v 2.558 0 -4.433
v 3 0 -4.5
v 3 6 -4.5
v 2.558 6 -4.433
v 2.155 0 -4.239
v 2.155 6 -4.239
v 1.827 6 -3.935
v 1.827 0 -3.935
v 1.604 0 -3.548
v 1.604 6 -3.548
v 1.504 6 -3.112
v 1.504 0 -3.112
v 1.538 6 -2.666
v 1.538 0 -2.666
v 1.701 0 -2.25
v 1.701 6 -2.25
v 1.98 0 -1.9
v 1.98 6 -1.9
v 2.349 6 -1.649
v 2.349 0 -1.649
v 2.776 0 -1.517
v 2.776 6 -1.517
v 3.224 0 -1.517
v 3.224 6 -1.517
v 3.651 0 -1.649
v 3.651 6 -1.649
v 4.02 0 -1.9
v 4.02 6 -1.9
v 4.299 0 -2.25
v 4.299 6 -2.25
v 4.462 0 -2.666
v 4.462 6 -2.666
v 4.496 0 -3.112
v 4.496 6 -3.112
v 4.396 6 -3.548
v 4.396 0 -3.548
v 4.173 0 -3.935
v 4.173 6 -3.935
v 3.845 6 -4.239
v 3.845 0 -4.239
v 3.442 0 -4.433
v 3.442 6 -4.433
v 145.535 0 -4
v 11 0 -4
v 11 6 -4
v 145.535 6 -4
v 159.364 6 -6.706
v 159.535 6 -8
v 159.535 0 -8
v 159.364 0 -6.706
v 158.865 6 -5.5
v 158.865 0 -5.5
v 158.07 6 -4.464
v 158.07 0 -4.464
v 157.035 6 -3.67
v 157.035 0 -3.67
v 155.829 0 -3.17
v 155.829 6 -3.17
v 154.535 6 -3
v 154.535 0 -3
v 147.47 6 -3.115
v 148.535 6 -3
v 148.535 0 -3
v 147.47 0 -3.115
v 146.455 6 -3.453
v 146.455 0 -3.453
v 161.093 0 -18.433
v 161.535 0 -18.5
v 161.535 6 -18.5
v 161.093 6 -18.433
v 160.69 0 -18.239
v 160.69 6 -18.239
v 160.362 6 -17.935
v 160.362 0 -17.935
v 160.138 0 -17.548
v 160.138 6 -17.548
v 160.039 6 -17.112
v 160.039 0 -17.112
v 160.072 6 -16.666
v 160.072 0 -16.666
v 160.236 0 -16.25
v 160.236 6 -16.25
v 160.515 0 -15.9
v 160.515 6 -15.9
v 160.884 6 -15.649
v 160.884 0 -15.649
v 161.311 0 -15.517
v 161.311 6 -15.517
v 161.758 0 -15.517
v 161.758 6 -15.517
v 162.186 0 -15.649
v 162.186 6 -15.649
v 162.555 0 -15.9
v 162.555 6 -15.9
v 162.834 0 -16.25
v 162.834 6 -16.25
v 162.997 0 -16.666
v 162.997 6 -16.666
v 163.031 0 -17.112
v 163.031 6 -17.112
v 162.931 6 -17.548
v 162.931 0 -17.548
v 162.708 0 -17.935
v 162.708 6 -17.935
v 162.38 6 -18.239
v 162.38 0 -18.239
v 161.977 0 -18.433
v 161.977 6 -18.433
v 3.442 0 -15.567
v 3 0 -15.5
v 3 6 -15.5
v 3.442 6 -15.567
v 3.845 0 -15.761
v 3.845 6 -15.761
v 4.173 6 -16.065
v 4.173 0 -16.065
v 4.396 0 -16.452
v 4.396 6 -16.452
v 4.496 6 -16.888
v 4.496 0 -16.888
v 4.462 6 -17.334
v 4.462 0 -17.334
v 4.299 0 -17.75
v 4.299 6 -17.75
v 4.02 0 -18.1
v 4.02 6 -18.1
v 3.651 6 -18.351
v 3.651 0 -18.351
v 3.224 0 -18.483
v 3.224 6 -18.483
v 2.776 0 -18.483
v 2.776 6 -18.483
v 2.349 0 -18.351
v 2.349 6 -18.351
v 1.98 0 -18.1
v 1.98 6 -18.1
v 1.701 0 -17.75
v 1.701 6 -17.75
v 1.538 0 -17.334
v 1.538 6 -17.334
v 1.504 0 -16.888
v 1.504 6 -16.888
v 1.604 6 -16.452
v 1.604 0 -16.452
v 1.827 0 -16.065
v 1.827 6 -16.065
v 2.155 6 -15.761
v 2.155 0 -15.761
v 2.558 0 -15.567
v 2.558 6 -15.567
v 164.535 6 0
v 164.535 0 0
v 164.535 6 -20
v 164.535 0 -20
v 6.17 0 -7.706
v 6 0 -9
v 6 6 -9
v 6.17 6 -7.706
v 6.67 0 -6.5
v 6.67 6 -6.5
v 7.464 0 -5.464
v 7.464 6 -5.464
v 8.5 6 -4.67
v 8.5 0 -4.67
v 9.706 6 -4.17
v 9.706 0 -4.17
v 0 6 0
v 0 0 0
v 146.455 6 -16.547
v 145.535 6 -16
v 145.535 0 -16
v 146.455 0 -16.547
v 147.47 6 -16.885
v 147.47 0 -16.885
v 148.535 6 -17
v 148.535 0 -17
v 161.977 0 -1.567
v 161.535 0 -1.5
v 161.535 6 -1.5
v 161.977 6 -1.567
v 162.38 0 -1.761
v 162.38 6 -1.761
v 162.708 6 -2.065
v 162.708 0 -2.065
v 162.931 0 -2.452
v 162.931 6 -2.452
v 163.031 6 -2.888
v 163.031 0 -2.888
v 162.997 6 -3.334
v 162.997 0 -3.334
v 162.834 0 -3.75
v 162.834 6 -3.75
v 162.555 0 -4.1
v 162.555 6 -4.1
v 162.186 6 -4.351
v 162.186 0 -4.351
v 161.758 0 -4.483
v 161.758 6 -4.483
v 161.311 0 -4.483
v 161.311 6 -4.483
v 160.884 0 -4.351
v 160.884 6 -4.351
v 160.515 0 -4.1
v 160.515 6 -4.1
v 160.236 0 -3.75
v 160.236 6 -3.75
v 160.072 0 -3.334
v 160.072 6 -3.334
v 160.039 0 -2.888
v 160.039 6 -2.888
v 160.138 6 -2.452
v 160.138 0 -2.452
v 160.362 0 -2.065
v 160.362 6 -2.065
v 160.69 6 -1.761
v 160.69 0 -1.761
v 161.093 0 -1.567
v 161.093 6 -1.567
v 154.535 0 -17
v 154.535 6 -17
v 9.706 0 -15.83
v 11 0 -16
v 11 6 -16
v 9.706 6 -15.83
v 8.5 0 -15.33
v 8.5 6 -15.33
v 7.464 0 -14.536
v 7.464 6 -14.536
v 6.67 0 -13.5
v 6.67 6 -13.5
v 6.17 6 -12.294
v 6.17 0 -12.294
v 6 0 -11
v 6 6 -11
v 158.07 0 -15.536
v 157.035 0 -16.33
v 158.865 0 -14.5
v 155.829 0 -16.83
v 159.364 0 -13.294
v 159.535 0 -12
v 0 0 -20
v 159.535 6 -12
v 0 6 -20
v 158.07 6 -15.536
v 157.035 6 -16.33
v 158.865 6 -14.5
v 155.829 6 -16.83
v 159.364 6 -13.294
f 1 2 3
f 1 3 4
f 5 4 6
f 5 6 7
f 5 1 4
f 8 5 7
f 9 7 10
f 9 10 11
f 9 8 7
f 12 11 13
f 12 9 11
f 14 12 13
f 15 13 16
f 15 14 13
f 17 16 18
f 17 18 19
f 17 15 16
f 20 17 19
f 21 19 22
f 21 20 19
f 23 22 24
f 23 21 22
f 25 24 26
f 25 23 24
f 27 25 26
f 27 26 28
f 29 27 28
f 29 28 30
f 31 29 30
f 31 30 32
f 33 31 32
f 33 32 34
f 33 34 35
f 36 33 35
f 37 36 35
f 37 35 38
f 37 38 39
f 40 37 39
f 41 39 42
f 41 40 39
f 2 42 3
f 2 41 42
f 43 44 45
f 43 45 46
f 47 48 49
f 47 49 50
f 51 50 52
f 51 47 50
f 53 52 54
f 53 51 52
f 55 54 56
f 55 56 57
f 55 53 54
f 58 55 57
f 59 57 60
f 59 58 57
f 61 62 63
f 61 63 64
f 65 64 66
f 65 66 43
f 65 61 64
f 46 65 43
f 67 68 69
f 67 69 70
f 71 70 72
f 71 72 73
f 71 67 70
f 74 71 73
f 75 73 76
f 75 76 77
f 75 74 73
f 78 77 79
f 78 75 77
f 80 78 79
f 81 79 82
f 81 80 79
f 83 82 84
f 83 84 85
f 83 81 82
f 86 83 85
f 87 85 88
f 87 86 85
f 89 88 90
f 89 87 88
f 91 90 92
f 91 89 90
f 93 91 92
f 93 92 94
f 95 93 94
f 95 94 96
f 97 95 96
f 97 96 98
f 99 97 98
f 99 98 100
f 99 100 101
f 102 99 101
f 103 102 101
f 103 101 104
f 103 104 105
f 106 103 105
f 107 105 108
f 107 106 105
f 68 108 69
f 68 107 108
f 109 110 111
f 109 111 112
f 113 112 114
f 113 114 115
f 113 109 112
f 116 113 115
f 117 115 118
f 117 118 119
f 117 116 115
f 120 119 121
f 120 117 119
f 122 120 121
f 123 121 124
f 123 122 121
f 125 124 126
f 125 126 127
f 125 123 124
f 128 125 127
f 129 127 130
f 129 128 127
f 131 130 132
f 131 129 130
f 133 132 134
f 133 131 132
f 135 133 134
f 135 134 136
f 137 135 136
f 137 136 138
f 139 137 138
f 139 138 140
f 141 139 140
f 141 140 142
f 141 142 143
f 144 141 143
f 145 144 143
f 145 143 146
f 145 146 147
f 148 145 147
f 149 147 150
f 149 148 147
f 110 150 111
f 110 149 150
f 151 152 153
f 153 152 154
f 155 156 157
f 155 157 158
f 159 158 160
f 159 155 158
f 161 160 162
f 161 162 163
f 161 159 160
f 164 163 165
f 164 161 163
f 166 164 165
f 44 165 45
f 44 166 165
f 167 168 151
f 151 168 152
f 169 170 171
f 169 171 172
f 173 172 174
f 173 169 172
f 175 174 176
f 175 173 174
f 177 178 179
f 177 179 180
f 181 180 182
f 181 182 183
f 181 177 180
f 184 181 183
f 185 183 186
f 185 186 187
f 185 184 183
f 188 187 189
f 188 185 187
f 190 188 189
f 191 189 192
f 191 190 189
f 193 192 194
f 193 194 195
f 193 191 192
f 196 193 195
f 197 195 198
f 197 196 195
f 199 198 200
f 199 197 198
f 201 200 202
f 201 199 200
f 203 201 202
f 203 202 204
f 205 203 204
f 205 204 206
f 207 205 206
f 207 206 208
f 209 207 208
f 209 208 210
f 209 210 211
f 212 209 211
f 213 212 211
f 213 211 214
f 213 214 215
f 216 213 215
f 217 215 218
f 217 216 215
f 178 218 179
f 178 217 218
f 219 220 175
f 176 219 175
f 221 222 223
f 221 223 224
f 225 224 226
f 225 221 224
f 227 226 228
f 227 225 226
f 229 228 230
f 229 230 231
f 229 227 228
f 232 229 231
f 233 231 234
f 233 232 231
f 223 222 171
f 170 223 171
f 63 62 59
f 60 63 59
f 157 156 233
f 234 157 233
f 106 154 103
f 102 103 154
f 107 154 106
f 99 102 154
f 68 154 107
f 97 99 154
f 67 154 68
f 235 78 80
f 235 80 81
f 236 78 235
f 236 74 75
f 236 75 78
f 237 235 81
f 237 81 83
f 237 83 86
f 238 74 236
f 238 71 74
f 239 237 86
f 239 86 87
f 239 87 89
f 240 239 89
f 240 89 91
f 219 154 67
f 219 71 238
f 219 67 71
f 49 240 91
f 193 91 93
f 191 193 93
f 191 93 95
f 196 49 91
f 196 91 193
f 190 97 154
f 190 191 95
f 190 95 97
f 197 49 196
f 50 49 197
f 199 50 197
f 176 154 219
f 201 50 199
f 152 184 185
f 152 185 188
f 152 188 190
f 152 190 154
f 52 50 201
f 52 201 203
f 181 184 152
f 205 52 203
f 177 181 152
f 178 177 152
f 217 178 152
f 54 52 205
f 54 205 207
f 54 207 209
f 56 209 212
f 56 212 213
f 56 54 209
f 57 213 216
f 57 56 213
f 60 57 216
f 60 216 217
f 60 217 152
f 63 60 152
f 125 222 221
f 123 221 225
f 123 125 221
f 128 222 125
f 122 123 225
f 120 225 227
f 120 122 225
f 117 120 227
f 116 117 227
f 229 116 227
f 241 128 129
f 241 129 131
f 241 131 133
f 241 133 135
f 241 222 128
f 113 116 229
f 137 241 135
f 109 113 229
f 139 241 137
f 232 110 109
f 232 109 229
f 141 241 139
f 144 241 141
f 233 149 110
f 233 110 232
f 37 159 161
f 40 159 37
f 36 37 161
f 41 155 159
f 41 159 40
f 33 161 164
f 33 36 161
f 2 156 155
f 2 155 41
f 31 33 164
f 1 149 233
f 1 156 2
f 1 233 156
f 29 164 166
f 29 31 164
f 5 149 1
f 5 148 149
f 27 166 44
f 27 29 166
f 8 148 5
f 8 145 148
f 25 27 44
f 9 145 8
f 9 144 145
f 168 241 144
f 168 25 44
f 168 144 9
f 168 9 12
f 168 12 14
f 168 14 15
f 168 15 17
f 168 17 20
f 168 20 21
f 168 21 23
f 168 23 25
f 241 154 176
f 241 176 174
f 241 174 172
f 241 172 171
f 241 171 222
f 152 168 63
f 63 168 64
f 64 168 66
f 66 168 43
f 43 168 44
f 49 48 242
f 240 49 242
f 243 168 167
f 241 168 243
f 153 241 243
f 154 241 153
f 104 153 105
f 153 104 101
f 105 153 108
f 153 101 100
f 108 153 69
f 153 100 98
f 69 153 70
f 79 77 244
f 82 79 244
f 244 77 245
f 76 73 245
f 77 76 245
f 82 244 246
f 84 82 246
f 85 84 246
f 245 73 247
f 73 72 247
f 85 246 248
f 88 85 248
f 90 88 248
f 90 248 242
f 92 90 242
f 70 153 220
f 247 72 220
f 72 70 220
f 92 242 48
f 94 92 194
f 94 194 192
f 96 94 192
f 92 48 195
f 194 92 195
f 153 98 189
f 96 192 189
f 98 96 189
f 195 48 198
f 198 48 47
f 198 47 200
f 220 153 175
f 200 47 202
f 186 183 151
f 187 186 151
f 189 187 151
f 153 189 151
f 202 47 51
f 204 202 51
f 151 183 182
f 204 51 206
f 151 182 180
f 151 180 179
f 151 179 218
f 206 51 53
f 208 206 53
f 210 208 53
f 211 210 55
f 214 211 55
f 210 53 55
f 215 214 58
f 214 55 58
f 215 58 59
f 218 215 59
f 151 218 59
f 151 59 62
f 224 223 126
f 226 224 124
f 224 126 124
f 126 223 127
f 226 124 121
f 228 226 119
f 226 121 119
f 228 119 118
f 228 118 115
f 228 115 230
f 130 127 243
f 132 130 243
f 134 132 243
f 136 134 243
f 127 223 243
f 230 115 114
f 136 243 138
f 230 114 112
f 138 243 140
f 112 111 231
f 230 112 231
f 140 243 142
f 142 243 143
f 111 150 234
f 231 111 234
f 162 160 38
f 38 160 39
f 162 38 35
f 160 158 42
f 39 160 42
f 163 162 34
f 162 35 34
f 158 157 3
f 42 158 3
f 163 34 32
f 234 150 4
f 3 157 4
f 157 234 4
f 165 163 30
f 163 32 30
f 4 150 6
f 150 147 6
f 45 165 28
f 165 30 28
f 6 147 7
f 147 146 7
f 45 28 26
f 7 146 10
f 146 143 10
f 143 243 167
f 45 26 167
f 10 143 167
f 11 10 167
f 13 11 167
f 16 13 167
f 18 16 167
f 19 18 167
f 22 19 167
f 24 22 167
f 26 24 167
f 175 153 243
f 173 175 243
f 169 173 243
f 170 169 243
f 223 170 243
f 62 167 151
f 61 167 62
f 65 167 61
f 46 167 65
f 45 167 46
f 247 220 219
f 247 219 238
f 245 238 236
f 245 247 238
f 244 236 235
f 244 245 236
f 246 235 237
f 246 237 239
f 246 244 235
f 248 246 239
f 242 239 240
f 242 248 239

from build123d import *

# Parameters (mm, degrees)
SKETCH1_W           = 164.534777256
SKETCH1_H           = 20
SKETCH1_R           = 1.5
SKETCH1_W_2         = 152.534777256
SKETCH1_H_2         = 12
BOSS_EXTRUDE1_DEPTH = 6
CUT_EXTRUDE1_DEPTH  = 166.854432943
FILLET1_R           = 5


with BuildPart() as part:
    # Sketch1 → Boss-Extrude1 (new body)
    with BuildSketch(Plane(origin=(0, 0, 0), x_dir=(1, 0, 0), z_dir=(0, 1, 0))):
        with Locations((82.267388628, 10)):
            Rectangle(SKETCH1_W, SKETCH1_H)
        with Locations(Location((3, 17, 0), (0, 0, 270))):
            Circle(SKETCH1_R, mode=Mode.SUBTRACT)
        with Locations(Location((3, 3, 0), (0, 0, 90))):
            Circle(SKETCH1_R, mode=Mode.SUBTRACT)
        with Locations(Location((161.534777256, 3, 0), (0, 0, 270))):
            Circle(SKETCH1_R, mode=Mode.SUBTRACT)
        with Locations(Location((161.534777256, 17, 0), (0, 0, 90))):
            Circle(SKETCH1_R, mode=Mode.SUBTRACT)
        with Locations((82.267388628, 10)):
            Rectangle(SKETCH1_W_2, SKETCH1_H_2, mode=Mode.SUBTRACT)
    extrude(amount=BOSS_EXTRUDE1_DEPTH)

    # Sketch2 → Cut-Extrude1 (cut, through all)
    with BuildSketch(Plane(origin=(0, 6, 0), x_dir=(1, 0, 0), z_dir=(0, 1, 0))):
        Polygon((145.534777256, 17), (145.534777256, 16), (158.534777256, 16), (158.534777256, 4), (145.534777256, 4), (145.534777256, 3), (159.534777256, 3), (159.534777256, 17), align=None)
    extrude(amount=-CUT_EXTRUDE1_DEPTH, mode=Mode.SUBTRACT)

    # Fillet1
    # the kernel refuses this fillet: 5 mm, written as the material it adds along each edge
    with BuildSketch(Plane(origin=(159.534777256, 6, -17), x_dir=(0, 0, 1), z_dir=(0, -1, 0)), Plane(origin=(159.534777256, 6, -3), x_dir=(-1, 0, 0), z_dir=(0, -1, 0)), Plane(origin=(6, 0, -16), x_dir=(0, 0, 1), z_dir=(0, 1, 0))) as fillet1_piece_1:
        with BuildLine():
            CenterArc((FILLET1_R, FILLET1_R), FILLET1_R, 180, 90)
            Line((0, FILLET1_R), (-FILLET1_R * 0.02, FILLET1_R))
            Line((-FILLET1_R * 0.02, FILLET1_R), (-FILLET1_R * 0.02, -FILLET1_R * 0.02))
            Line((-FILLET1_R * 0.02, -FILLET1_R * 0.02), (FILLET1_R, -FILLET1_R * 0.02))
            Line((FILLET1_R, -FILLET1_R * 0.02), (FILLET1_R, 0))
        make_face()
    extrude(amount=6)
    with BuildSketch(Plane(origin=(145.534777256, 6, -17), x_dir=(1, 0, 0), z_dir=(0, -1, 0))) as fillet1_piece_2:
        with BuildLine():
            CenterArc((3, 5), FILLET1_R, 233.130102354, 36.869897646)
            Line((0, 1), (-0.06, 0.92))
            ThreePointArc((-0.06, 0.92), (-0.1, 0.5), (-0.1, 0))
            Line((-0.1, 0), (0, -0.1))
            Line((0, -0.1), (3, -0.1))
            Line((3, -0.1), (3, 0))
        make_face()
    extrude(amount=6)
    with BuildSketch(Plane(origin=(145.534777256, 6, -3), x_dir=(0, 0, -1), z_dir=(0, -1, 0))) as fillet1_piece_3:
        with BuildLine():
            CenterArc((5, 3), FILLET1_R, 180, 36.869897646)
            Line((0, 3), (-0.1, 3))
            Line((-0.1, 3), (-0.1, 0))
            Line((-0.1, 0), (0, -0.1))
            ThreePointArc((0, -0.1), (0.5, -0.1), (0.92, -0.06))
            Line((0.92, -0.06), (1, 0))
        make_face()
    extrude(amount=6)
    with BuildSketch(Plane(origin=(6, 0, -4), x_dir=(0, 0, -1), z_dir=(0, 1, 0))) as fillet1_piece_4:
        with BuildLine():
            CenterArc((FILLET1_R, -FILLET1_R), FILLET1_R, 90, 90)
            Line((0, -FILLET1_R), (-FILLET1_R * 0.02, -FILLET1_R))
            Line((-FILLET1_R * 0.02, -FILLET1_R), (-FILLET1_R * 0.02, FILLET1_R * 0.02))
            Line((-FILLET1_R * 0.02, FILLET1_R * 0.02), (FILLET1_R, FILLET1_R * 0.02))
            Line((FILLET1_R, FILLET1_R * 0.02), (FILLET1_R, 0))
        make_face()
    extrude(amount=6)


solid = part.part
